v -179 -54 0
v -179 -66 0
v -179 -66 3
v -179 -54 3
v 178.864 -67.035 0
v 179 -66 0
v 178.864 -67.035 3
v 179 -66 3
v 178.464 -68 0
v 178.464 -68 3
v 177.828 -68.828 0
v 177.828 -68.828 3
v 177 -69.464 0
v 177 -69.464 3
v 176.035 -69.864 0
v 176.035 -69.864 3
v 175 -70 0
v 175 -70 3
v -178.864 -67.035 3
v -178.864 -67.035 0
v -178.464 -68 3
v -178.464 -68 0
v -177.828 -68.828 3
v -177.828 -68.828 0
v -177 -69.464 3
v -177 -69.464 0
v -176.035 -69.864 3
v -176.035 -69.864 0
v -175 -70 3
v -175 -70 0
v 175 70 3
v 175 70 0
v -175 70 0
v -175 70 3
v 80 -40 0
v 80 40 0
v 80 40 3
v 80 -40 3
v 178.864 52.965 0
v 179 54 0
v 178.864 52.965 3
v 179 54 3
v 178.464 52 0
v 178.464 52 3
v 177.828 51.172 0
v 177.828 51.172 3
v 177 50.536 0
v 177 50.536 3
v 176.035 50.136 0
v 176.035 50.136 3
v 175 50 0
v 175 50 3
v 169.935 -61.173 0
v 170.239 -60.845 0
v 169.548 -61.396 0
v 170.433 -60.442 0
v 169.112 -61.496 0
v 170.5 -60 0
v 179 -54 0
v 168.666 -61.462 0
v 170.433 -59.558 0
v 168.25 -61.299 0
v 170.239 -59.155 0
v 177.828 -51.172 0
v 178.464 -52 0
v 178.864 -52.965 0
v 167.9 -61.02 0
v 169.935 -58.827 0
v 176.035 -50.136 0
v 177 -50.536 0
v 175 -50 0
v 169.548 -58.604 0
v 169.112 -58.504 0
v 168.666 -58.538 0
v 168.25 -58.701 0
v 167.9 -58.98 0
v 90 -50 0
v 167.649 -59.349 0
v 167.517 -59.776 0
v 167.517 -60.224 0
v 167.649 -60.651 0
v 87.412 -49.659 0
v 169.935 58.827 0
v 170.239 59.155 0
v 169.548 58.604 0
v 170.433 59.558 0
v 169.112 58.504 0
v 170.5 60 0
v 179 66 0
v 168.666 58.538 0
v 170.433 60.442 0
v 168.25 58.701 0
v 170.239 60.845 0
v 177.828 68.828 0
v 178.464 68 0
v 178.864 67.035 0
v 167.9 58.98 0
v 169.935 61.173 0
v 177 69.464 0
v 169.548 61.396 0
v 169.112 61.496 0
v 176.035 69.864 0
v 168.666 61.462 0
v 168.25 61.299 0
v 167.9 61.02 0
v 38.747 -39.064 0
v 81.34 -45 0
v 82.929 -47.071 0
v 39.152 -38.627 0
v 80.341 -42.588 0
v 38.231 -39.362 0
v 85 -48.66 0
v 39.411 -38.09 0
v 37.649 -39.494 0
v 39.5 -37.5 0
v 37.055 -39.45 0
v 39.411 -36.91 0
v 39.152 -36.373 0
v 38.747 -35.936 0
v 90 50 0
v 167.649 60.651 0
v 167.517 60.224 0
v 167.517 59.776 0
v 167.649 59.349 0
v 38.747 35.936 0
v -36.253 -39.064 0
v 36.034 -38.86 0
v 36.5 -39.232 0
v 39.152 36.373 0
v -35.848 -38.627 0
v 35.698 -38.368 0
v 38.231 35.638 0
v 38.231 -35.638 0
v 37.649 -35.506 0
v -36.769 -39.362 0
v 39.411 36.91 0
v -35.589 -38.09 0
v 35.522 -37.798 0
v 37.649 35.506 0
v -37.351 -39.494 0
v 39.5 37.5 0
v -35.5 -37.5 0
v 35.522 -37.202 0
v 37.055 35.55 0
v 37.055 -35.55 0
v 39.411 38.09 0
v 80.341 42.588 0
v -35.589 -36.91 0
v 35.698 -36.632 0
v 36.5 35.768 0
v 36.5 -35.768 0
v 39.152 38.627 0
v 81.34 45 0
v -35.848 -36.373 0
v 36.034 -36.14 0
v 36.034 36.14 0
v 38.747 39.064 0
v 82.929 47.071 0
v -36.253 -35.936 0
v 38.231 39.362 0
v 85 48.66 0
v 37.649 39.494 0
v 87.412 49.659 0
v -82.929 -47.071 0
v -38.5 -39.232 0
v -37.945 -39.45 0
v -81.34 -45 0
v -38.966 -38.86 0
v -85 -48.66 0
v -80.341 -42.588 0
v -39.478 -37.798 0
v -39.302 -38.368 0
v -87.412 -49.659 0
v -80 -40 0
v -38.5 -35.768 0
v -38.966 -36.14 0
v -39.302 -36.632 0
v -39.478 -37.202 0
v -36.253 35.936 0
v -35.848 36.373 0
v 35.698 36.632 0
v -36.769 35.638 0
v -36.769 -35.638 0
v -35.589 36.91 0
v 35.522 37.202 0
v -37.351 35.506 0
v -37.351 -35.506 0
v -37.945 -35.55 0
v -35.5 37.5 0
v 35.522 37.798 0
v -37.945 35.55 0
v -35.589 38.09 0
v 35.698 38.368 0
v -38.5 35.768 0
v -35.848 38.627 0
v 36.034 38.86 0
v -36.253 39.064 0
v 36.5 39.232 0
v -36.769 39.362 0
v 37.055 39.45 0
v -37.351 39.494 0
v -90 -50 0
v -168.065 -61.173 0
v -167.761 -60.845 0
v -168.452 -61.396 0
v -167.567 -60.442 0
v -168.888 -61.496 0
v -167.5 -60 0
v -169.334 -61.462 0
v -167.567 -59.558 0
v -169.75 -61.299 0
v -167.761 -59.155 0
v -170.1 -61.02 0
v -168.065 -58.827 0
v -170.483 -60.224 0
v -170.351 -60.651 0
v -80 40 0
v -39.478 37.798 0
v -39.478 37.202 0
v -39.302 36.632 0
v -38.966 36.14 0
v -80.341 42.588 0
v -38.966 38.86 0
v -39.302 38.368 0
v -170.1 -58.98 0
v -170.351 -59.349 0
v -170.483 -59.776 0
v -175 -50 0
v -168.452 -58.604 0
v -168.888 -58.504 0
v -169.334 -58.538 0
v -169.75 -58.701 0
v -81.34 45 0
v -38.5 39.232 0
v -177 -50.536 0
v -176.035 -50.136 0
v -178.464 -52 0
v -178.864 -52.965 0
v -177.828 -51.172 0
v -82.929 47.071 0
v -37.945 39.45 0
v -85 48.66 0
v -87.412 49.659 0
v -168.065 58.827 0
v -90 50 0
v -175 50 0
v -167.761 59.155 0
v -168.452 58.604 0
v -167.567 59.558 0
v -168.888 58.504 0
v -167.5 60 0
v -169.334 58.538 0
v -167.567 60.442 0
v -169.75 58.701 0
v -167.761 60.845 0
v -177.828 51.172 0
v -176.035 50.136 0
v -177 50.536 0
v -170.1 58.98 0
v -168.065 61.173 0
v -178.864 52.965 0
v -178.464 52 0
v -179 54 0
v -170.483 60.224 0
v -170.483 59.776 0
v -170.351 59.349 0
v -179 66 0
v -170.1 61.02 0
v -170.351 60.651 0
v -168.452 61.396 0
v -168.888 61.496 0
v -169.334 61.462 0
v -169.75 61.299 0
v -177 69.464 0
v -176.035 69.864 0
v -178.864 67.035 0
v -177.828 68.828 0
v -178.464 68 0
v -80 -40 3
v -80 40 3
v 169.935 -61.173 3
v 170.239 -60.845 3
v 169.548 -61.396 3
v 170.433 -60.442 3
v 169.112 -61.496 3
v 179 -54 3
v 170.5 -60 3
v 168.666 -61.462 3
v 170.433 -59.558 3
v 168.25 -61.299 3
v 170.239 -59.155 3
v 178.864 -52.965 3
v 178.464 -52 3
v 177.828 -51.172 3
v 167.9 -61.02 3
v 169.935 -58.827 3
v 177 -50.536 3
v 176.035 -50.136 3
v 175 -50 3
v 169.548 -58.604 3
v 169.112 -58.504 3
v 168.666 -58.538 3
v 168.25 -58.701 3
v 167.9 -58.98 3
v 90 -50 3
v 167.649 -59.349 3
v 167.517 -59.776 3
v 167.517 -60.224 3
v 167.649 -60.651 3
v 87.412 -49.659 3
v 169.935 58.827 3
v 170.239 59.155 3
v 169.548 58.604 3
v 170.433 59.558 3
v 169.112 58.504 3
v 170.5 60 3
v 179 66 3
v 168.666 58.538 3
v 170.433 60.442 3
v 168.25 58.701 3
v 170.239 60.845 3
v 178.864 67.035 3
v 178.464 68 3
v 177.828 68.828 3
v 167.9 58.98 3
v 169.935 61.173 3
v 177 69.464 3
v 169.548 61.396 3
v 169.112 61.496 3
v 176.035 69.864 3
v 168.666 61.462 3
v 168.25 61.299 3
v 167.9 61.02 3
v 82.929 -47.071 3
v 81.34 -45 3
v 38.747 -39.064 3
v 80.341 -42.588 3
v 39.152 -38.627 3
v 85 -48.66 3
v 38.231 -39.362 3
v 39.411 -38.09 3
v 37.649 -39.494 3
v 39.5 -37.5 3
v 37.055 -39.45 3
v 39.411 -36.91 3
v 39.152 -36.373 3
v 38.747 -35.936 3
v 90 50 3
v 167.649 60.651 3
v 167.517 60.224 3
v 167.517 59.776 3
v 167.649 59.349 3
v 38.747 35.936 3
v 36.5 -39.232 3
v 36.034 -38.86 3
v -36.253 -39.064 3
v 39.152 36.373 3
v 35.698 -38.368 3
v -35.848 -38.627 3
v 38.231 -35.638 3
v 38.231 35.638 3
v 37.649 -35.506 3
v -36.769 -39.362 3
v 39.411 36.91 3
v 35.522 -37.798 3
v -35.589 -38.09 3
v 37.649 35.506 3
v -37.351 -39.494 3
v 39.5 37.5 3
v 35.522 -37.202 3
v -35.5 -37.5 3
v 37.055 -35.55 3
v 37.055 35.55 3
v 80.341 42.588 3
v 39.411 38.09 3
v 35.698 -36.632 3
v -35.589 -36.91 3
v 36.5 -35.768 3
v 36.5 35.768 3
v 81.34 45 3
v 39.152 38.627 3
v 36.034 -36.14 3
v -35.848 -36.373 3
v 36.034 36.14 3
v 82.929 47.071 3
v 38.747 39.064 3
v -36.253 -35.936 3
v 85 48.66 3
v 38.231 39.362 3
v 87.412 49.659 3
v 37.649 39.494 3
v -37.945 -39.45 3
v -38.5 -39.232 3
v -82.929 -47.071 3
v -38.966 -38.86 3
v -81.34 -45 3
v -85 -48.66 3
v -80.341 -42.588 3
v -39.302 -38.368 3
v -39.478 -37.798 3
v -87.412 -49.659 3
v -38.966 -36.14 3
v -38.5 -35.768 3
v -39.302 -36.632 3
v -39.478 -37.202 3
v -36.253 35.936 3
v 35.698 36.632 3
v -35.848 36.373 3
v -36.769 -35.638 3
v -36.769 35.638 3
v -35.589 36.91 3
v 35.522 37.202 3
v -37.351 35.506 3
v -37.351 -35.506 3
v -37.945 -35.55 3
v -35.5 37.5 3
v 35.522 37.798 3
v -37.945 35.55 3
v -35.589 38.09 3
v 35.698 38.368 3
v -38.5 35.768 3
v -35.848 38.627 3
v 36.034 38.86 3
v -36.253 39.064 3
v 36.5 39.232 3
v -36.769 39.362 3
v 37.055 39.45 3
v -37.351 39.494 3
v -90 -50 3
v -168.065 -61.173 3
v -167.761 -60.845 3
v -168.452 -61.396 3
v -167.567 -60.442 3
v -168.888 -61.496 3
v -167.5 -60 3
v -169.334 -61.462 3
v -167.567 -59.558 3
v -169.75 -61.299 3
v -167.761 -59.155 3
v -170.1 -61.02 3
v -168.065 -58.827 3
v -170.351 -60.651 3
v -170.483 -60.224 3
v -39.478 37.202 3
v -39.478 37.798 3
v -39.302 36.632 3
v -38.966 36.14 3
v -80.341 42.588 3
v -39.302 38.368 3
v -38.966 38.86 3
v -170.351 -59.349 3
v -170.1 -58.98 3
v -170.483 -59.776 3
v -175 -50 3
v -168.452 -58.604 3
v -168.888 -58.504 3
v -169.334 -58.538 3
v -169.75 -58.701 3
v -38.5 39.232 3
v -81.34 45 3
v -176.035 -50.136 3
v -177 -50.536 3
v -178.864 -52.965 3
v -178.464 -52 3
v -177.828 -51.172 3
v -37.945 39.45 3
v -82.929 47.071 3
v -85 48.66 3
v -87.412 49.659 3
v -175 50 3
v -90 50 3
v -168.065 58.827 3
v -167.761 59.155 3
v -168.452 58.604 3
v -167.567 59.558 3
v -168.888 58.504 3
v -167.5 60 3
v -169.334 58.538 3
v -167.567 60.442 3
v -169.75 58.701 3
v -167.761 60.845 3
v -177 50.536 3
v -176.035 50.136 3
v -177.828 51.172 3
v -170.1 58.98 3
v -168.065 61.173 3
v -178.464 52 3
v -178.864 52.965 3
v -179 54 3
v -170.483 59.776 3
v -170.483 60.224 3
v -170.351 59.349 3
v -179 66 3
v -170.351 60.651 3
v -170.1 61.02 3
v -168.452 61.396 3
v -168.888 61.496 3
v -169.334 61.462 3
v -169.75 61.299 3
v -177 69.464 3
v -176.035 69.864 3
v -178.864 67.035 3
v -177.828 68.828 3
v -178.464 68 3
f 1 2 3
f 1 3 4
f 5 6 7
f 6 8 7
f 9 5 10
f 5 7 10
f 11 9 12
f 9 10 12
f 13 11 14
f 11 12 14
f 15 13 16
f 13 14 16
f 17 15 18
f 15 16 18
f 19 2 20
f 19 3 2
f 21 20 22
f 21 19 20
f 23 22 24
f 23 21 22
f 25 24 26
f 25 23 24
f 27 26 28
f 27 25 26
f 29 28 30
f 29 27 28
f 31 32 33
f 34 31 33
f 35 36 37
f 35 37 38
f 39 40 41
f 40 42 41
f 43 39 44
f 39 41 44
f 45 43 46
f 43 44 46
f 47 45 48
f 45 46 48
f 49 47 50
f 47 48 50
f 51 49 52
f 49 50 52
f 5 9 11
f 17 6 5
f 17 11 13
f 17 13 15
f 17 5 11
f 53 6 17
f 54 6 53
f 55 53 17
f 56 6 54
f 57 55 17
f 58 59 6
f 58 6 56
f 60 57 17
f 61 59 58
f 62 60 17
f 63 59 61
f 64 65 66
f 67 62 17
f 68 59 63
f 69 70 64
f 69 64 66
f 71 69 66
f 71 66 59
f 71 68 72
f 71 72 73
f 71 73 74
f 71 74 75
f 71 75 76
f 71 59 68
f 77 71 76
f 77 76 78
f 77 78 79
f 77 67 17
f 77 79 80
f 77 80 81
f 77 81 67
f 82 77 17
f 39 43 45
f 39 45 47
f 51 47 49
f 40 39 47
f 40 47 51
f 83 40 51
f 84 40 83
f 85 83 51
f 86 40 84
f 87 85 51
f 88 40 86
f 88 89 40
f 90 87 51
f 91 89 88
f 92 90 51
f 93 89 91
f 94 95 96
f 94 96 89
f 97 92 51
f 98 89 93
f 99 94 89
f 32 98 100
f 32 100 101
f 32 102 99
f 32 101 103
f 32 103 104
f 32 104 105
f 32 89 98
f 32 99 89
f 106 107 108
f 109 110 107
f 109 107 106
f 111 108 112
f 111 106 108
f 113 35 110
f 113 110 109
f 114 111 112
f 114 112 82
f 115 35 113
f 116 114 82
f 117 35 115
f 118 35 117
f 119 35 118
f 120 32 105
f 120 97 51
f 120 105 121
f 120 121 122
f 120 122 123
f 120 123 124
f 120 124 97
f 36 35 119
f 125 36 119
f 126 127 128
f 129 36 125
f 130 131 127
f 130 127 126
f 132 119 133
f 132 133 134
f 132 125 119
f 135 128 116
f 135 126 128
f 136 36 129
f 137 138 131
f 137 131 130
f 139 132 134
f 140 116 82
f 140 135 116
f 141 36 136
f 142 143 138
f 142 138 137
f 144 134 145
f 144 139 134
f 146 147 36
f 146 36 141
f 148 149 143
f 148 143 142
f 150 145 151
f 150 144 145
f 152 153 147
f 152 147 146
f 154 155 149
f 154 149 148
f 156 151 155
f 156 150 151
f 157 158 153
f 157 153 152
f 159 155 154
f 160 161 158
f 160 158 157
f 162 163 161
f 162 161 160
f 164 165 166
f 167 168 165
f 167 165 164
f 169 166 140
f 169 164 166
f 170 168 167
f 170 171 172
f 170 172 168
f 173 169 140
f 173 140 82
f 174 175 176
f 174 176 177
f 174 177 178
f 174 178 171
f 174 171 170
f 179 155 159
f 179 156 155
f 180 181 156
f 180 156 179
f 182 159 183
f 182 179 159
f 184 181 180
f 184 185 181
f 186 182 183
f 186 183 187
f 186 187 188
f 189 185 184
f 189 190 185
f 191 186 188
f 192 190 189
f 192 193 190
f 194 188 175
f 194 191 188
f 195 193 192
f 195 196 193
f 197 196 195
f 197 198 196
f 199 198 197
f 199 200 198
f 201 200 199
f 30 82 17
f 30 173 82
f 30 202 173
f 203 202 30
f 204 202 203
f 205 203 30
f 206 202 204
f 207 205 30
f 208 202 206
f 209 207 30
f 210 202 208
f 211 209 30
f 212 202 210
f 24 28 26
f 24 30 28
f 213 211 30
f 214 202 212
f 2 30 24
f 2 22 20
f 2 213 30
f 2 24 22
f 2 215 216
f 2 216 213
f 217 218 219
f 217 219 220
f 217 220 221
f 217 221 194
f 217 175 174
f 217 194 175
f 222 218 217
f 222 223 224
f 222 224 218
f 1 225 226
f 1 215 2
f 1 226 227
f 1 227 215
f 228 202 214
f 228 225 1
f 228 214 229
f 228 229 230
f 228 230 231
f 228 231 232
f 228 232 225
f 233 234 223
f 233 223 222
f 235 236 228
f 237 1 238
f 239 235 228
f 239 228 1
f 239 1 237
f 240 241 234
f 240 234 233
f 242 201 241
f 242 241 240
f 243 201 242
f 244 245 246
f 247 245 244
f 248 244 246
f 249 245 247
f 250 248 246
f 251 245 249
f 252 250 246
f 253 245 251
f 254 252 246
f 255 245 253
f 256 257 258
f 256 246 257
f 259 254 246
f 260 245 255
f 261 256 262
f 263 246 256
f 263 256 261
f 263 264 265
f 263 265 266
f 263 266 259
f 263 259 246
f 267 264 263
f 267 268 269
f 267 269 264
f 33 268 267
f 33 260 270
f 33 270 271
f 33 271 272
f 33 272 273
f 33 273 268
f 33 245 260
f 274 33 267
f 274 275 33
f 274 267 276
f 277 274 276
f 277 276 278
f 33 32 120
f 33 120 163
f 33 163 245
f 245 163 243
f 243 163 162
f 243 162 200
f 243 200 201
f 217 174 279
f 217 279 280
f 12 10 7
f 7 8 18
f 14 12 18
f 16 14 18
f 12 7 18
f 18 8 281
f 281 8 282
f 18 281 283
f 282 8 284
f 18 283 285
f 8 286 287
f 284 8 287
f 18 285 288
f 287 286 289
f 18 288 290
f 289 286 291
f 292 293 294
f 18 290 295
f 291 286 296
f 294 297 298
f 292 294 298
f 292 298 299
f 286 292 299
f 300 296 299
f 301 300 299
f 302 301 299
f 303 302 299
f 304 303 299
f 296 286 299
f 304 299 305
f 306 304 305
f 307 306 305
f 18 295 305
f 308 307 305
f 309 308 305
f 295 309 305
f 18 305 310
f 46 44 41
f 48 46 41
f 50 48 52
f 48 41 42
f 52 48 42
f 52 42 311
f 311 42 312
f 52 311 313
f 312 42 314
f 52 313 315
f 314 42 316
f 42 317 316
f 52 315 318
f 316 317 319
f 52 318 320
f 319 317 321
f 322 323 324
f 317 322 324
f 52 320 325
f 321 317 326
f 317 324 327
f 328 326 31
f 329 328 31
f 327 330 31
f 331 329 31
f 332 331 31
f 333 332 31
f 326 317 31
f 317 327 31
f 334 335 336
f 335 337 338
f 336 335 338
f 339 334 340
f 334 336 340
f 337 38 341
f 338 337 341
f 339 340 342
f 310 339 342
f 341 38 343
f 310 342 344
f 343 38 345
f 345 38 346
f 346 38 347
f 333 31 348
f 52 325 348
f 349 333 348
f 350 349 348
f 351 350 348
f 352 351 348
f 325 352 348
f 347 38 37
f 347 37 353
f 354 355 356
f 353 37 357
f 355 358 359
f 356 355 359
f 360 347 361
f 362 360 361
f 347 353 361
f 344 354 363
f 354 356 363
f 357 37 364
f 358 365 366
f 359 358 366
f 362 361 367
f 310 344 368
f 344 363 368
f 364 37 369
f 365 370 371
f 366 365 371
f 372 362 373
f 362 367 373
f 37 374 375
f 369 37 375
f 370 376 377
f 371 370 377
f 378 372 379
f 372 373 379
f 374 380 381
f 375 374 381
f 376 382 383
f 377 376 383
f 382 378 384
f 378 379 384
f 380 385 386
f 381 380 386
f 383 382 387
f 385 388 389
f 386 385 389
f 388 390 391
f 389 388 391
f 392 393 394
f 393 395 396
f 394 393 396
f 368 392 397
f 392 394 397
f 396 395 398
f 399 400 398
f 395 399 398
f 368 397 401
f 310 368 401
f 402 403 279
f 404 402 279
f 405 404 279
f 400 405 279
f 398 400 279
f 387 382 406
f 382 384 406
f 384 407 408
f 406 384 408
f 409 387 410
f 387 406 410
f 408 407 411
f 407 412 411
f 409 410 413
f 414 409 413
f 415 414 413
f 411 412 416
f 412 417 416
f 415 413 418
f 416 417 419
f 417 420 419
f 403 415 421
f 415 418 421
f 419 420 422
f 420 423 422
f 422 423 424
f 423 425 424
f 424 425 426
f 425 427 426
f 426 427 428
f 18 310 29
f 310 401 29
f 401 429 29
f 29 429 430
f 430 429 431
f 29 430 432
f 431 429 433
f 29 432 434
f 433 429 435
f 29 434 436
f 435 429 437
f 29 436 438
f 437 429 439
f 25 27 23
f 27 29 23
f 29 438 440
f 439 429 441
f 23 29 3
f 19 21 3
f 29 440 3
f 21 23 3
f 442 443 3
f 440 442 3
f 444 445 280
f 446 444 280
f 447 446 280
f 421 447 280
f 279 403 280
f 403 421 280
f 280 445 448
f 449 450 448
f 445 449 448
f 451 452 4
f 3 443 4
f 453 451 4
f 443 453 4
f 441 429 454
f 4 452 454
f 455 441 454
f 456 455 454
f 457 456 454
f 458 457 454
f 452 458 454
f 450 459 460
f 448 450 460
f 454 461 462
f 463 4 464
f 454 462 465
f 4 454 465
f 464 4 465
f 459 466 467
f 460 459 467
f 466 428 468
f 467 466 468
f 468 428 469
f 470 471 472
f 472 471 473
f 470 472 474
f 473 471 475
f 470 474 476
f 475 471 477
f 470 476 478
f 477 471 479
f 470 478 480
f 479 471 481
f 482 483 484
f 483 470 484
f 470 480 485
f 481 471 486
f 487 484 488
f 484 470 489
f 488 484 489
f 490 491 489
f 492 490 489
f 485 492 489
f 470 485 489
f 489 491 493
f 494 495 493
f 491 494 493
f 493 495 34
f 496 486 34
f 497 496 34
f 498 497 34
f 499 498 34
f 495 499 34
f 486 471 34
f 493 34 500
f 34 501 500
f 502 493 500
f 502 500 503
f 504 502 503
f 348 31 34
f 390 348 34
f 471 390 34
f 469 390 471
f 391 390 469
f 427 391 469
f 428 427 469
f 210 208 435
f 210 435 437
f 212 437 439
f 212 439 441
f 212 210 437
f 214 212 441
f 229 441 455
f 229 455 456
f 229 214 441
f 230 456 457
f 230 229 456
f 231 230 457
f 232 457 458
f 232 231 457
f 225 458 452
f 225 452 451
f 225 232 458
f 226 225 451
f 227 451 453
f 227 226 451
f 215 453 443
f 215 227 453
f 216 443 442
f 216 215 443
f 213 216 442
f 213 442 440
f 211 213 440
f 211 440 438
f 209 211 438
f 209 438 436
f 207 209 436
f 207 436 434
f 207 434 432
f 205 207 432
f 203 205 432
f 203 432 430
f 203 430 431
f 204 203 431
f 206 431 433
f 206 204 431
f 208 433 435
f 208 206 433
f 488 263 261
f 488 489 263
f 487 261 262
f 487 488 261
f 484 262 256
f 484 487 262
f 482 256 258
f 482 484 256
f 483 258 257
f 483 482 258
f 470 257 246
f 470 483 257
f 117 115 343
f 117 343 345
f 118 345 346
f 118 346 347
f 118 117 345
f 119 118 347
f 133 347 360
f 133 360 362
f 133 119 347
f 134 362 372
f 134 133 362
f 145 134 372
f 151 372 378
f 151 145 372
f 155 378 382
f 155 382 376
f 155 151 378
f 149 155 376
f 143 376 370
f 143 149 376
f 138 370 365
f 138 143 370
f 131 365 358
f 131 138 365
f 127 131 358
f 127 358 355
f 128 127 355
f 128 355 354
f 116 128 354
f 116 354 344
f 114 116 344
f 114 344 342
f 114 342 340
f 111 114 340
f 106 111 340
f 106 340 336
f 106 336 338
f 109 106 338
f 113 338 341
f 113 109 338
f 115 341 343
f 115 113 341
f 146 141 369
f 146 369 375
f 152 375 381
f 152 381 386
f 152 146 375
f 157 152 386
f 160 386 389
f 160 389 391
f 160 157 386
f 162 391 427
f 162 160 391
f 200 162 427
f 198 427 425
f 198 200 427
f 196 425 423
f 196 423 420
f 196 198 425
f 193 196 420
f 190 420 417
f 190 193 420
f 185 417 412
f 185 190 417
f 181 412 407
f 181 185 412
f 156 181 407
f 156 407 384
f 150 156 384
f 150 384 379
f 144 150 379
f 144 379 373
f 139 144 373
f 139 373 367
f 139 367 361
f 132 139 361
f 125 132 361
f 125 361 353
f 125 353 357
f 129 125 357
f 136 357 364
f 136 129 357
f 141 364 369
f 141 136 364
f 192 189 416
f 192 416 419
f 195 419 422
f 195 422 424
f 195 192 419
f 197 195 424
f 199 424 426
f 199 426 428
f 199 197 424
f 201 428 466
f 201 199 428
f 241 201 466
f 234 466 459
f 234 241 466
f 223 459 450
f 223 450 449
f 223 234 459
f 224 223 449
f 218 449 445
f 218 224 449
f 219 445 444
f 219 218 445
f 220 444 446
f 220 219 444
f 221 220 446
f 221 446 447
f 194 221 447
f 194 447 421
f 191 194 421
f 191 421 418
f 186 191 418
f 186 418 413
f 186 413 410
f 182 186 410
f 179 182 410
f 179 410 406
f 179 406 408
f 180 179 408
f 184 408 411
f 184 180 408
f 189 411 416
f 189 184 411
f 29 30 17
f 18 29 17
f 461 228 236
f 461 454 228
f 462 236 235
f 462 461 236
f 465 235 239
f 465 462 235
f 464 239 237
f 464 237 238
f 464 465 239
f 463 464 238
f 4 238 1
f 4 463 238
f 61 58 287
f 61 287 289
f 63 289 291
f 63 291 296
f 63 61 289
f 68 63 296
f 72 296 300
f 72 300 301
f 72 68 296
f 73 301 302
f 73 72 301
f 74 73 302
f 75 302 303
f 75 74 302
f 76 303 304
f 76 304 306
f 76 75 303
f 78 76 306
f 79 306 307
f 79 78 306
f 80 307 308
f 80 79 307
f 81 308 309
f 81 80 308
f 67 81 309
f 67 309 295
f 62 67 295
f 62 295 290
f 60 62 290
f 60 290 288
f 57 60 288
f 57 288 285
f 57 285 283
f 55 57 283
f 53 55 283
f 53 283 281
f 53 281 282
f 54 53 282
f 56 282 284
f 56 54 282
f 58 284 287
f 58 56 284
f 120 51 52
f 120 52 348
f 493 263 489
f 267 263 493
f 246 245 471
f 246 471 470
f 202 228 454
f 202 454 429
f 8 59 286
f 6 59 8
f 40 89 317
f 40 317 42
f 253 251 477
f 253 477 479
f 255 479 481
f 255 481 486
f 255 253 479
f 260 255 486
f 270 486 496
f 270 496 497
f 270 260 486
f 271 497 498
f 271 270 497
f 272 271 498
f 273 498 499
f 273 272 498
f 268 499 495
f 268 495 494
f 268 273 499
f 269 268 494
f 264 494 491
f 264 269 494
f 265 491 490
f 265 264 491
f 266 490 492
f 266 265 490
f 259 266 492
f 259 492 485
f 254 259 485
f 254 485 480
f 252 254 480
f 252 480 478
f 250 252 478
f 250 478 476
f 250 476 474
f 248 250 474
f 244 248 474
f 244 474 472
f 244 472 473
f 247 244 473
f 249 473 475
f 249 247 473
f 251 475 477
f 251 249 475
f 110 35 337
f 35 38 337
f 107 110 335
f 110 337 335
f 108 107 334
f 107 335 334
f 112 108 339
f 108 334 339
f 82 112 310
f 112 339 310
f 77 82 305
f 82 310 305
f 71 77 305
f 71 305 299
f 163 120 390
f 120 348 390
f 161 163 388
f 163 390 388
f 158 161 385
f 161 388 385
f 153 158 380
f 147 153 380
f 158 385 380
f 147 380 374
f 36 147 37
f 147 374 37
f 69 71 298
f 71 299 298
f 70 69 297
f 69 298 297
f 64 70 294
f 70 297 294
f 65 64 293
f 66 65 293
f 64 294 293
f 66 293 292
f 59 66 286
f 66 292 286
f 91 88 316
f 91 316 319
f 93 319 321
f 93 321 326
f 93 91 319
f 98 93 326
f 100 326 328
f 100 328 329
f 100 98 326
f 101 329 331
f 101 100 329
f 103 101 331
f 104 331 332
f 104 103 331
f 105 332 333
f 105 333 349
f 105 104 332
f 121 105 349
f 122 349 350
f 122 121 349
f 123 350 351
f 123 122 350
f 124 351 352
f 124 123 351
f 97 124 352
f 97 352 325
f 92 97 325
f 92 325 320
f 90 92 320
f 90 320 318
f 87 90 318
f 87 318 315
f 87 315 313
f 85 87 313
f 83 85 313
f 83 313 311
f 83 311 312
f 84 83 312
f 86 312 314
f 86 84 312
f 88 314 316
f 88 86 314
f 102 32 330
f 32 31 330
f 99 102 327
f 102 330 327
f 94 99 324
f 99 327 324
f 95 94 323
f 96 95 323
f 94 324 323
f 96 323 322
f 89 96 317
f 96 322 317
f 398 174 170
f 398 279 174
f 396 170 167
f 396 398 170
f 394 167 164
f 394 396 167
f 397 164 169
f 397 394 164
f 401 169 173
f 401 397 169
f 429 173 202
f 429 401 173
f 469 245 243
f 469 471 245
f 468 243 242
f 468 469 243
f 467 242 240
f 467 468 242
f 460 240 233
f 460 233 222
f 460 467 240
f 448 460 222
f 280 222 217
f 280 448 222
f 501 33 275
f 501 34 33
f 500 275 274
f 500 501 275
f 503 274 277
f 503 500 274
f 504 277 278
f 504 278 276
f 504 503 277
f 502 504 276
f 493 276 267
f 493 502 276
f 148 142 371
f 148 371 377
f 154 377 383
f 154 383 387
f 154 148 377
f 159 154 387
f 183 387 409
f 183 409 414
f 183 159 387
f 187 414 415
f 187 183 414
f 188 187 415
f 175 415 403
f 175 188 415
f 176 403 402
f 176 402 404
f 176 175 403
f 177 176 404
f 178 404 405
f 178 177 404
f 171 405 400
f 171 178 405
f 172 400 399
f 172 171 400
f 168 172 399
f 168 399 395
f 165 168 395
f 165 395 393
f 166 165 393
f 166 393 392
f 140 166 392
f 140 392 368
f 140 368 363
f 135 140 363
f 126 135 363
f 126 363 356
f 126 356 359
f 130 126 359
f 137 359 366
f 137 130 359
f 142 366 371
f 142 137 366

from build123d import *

# Parameters (mm, degrees)
SKETCH1_R           = 1.5
SKETCH1_R_2         = 2
BOSS_EXTRUDE1_DEPTH = 3
FILLET1_R           = 4
FILLET2_R           = 10


with BuildPart() as part:
    # Sketch1 → Boss-Extrude1 (new body)
    with BuildSketch(Plane.XY):
        Polygon((-164.552800631, 70), (164.552800631, 70), (179, 70), (179, 50), (80, 50), (80, -50), (179, -50), (179, -70), (164.552800631, -70), (-164.552800631, -70), (-179, -70), (-179, -50), (-80, -50), (-80, 50), (-179, 50), (-179, 70), align=None)
        with Locations((-169, 60)):
            Circle(SKETCH1_R, mode=Mode.SUBTRACT)
        with Locations((-37.5, 37.5)):
            Circle(SKETCH1_R_2, mode=Mode.SUBTRACT)
        with Locations((37.5, 37.5)):
            Circle(SKETCH1_R_2, mode=Mode.SUBTRACT)
        with Locations((169, 60)):
            Circle(SKETCH1_R, mode=Mode.SUBTRACT)
        with Locations((169, -60)):
            Circle(SKETCH1_R, mode=Mode.SUBTRACT)
        with Locations((37.5, -37.5)):
            Circle(SKETCH1_R_2, mode=Mode.SUBTRACT)
        with Locations((-37.5, -37.5)):
            Circle(SKETCH1_R_2, mode=Mode.SUBTRACT)
        with Locations((-169, -60)):
            Circle(SKETCH1_R, mode=Mode.SUBTRACT)
    extrude(amount=BOSS_EXTRUDE1_DEPTH)

    # Fillet1
    fillet1_edges = [part.edges().sort_by_distance(p)[0] for p in [
        (179, 70, 1.5),
        (179, 50, 1.5),
        (179, -50, 1.5),
        (179, -70, 1.5),
        (-179, -70, 1.5),
        (-179, -50, 1.5),
        (-179, 50, 1.5),
        (-179, 70, 1.5),
    ]]
    fillet(fillet1_edges, radius=FILLET1_R)

    # Fillet2
    fillet2_edges = [part.edges().sort_by_distance(p)[0] for p in [
        (80, 50, 1.5),
        (80, -50, 1.5),
        (-80, -50, 1.5),
        (-80, 50, 1.5),
    ]]
    fillet(fillet2_edges, radius=FILLET2_R)


solid = part.part
